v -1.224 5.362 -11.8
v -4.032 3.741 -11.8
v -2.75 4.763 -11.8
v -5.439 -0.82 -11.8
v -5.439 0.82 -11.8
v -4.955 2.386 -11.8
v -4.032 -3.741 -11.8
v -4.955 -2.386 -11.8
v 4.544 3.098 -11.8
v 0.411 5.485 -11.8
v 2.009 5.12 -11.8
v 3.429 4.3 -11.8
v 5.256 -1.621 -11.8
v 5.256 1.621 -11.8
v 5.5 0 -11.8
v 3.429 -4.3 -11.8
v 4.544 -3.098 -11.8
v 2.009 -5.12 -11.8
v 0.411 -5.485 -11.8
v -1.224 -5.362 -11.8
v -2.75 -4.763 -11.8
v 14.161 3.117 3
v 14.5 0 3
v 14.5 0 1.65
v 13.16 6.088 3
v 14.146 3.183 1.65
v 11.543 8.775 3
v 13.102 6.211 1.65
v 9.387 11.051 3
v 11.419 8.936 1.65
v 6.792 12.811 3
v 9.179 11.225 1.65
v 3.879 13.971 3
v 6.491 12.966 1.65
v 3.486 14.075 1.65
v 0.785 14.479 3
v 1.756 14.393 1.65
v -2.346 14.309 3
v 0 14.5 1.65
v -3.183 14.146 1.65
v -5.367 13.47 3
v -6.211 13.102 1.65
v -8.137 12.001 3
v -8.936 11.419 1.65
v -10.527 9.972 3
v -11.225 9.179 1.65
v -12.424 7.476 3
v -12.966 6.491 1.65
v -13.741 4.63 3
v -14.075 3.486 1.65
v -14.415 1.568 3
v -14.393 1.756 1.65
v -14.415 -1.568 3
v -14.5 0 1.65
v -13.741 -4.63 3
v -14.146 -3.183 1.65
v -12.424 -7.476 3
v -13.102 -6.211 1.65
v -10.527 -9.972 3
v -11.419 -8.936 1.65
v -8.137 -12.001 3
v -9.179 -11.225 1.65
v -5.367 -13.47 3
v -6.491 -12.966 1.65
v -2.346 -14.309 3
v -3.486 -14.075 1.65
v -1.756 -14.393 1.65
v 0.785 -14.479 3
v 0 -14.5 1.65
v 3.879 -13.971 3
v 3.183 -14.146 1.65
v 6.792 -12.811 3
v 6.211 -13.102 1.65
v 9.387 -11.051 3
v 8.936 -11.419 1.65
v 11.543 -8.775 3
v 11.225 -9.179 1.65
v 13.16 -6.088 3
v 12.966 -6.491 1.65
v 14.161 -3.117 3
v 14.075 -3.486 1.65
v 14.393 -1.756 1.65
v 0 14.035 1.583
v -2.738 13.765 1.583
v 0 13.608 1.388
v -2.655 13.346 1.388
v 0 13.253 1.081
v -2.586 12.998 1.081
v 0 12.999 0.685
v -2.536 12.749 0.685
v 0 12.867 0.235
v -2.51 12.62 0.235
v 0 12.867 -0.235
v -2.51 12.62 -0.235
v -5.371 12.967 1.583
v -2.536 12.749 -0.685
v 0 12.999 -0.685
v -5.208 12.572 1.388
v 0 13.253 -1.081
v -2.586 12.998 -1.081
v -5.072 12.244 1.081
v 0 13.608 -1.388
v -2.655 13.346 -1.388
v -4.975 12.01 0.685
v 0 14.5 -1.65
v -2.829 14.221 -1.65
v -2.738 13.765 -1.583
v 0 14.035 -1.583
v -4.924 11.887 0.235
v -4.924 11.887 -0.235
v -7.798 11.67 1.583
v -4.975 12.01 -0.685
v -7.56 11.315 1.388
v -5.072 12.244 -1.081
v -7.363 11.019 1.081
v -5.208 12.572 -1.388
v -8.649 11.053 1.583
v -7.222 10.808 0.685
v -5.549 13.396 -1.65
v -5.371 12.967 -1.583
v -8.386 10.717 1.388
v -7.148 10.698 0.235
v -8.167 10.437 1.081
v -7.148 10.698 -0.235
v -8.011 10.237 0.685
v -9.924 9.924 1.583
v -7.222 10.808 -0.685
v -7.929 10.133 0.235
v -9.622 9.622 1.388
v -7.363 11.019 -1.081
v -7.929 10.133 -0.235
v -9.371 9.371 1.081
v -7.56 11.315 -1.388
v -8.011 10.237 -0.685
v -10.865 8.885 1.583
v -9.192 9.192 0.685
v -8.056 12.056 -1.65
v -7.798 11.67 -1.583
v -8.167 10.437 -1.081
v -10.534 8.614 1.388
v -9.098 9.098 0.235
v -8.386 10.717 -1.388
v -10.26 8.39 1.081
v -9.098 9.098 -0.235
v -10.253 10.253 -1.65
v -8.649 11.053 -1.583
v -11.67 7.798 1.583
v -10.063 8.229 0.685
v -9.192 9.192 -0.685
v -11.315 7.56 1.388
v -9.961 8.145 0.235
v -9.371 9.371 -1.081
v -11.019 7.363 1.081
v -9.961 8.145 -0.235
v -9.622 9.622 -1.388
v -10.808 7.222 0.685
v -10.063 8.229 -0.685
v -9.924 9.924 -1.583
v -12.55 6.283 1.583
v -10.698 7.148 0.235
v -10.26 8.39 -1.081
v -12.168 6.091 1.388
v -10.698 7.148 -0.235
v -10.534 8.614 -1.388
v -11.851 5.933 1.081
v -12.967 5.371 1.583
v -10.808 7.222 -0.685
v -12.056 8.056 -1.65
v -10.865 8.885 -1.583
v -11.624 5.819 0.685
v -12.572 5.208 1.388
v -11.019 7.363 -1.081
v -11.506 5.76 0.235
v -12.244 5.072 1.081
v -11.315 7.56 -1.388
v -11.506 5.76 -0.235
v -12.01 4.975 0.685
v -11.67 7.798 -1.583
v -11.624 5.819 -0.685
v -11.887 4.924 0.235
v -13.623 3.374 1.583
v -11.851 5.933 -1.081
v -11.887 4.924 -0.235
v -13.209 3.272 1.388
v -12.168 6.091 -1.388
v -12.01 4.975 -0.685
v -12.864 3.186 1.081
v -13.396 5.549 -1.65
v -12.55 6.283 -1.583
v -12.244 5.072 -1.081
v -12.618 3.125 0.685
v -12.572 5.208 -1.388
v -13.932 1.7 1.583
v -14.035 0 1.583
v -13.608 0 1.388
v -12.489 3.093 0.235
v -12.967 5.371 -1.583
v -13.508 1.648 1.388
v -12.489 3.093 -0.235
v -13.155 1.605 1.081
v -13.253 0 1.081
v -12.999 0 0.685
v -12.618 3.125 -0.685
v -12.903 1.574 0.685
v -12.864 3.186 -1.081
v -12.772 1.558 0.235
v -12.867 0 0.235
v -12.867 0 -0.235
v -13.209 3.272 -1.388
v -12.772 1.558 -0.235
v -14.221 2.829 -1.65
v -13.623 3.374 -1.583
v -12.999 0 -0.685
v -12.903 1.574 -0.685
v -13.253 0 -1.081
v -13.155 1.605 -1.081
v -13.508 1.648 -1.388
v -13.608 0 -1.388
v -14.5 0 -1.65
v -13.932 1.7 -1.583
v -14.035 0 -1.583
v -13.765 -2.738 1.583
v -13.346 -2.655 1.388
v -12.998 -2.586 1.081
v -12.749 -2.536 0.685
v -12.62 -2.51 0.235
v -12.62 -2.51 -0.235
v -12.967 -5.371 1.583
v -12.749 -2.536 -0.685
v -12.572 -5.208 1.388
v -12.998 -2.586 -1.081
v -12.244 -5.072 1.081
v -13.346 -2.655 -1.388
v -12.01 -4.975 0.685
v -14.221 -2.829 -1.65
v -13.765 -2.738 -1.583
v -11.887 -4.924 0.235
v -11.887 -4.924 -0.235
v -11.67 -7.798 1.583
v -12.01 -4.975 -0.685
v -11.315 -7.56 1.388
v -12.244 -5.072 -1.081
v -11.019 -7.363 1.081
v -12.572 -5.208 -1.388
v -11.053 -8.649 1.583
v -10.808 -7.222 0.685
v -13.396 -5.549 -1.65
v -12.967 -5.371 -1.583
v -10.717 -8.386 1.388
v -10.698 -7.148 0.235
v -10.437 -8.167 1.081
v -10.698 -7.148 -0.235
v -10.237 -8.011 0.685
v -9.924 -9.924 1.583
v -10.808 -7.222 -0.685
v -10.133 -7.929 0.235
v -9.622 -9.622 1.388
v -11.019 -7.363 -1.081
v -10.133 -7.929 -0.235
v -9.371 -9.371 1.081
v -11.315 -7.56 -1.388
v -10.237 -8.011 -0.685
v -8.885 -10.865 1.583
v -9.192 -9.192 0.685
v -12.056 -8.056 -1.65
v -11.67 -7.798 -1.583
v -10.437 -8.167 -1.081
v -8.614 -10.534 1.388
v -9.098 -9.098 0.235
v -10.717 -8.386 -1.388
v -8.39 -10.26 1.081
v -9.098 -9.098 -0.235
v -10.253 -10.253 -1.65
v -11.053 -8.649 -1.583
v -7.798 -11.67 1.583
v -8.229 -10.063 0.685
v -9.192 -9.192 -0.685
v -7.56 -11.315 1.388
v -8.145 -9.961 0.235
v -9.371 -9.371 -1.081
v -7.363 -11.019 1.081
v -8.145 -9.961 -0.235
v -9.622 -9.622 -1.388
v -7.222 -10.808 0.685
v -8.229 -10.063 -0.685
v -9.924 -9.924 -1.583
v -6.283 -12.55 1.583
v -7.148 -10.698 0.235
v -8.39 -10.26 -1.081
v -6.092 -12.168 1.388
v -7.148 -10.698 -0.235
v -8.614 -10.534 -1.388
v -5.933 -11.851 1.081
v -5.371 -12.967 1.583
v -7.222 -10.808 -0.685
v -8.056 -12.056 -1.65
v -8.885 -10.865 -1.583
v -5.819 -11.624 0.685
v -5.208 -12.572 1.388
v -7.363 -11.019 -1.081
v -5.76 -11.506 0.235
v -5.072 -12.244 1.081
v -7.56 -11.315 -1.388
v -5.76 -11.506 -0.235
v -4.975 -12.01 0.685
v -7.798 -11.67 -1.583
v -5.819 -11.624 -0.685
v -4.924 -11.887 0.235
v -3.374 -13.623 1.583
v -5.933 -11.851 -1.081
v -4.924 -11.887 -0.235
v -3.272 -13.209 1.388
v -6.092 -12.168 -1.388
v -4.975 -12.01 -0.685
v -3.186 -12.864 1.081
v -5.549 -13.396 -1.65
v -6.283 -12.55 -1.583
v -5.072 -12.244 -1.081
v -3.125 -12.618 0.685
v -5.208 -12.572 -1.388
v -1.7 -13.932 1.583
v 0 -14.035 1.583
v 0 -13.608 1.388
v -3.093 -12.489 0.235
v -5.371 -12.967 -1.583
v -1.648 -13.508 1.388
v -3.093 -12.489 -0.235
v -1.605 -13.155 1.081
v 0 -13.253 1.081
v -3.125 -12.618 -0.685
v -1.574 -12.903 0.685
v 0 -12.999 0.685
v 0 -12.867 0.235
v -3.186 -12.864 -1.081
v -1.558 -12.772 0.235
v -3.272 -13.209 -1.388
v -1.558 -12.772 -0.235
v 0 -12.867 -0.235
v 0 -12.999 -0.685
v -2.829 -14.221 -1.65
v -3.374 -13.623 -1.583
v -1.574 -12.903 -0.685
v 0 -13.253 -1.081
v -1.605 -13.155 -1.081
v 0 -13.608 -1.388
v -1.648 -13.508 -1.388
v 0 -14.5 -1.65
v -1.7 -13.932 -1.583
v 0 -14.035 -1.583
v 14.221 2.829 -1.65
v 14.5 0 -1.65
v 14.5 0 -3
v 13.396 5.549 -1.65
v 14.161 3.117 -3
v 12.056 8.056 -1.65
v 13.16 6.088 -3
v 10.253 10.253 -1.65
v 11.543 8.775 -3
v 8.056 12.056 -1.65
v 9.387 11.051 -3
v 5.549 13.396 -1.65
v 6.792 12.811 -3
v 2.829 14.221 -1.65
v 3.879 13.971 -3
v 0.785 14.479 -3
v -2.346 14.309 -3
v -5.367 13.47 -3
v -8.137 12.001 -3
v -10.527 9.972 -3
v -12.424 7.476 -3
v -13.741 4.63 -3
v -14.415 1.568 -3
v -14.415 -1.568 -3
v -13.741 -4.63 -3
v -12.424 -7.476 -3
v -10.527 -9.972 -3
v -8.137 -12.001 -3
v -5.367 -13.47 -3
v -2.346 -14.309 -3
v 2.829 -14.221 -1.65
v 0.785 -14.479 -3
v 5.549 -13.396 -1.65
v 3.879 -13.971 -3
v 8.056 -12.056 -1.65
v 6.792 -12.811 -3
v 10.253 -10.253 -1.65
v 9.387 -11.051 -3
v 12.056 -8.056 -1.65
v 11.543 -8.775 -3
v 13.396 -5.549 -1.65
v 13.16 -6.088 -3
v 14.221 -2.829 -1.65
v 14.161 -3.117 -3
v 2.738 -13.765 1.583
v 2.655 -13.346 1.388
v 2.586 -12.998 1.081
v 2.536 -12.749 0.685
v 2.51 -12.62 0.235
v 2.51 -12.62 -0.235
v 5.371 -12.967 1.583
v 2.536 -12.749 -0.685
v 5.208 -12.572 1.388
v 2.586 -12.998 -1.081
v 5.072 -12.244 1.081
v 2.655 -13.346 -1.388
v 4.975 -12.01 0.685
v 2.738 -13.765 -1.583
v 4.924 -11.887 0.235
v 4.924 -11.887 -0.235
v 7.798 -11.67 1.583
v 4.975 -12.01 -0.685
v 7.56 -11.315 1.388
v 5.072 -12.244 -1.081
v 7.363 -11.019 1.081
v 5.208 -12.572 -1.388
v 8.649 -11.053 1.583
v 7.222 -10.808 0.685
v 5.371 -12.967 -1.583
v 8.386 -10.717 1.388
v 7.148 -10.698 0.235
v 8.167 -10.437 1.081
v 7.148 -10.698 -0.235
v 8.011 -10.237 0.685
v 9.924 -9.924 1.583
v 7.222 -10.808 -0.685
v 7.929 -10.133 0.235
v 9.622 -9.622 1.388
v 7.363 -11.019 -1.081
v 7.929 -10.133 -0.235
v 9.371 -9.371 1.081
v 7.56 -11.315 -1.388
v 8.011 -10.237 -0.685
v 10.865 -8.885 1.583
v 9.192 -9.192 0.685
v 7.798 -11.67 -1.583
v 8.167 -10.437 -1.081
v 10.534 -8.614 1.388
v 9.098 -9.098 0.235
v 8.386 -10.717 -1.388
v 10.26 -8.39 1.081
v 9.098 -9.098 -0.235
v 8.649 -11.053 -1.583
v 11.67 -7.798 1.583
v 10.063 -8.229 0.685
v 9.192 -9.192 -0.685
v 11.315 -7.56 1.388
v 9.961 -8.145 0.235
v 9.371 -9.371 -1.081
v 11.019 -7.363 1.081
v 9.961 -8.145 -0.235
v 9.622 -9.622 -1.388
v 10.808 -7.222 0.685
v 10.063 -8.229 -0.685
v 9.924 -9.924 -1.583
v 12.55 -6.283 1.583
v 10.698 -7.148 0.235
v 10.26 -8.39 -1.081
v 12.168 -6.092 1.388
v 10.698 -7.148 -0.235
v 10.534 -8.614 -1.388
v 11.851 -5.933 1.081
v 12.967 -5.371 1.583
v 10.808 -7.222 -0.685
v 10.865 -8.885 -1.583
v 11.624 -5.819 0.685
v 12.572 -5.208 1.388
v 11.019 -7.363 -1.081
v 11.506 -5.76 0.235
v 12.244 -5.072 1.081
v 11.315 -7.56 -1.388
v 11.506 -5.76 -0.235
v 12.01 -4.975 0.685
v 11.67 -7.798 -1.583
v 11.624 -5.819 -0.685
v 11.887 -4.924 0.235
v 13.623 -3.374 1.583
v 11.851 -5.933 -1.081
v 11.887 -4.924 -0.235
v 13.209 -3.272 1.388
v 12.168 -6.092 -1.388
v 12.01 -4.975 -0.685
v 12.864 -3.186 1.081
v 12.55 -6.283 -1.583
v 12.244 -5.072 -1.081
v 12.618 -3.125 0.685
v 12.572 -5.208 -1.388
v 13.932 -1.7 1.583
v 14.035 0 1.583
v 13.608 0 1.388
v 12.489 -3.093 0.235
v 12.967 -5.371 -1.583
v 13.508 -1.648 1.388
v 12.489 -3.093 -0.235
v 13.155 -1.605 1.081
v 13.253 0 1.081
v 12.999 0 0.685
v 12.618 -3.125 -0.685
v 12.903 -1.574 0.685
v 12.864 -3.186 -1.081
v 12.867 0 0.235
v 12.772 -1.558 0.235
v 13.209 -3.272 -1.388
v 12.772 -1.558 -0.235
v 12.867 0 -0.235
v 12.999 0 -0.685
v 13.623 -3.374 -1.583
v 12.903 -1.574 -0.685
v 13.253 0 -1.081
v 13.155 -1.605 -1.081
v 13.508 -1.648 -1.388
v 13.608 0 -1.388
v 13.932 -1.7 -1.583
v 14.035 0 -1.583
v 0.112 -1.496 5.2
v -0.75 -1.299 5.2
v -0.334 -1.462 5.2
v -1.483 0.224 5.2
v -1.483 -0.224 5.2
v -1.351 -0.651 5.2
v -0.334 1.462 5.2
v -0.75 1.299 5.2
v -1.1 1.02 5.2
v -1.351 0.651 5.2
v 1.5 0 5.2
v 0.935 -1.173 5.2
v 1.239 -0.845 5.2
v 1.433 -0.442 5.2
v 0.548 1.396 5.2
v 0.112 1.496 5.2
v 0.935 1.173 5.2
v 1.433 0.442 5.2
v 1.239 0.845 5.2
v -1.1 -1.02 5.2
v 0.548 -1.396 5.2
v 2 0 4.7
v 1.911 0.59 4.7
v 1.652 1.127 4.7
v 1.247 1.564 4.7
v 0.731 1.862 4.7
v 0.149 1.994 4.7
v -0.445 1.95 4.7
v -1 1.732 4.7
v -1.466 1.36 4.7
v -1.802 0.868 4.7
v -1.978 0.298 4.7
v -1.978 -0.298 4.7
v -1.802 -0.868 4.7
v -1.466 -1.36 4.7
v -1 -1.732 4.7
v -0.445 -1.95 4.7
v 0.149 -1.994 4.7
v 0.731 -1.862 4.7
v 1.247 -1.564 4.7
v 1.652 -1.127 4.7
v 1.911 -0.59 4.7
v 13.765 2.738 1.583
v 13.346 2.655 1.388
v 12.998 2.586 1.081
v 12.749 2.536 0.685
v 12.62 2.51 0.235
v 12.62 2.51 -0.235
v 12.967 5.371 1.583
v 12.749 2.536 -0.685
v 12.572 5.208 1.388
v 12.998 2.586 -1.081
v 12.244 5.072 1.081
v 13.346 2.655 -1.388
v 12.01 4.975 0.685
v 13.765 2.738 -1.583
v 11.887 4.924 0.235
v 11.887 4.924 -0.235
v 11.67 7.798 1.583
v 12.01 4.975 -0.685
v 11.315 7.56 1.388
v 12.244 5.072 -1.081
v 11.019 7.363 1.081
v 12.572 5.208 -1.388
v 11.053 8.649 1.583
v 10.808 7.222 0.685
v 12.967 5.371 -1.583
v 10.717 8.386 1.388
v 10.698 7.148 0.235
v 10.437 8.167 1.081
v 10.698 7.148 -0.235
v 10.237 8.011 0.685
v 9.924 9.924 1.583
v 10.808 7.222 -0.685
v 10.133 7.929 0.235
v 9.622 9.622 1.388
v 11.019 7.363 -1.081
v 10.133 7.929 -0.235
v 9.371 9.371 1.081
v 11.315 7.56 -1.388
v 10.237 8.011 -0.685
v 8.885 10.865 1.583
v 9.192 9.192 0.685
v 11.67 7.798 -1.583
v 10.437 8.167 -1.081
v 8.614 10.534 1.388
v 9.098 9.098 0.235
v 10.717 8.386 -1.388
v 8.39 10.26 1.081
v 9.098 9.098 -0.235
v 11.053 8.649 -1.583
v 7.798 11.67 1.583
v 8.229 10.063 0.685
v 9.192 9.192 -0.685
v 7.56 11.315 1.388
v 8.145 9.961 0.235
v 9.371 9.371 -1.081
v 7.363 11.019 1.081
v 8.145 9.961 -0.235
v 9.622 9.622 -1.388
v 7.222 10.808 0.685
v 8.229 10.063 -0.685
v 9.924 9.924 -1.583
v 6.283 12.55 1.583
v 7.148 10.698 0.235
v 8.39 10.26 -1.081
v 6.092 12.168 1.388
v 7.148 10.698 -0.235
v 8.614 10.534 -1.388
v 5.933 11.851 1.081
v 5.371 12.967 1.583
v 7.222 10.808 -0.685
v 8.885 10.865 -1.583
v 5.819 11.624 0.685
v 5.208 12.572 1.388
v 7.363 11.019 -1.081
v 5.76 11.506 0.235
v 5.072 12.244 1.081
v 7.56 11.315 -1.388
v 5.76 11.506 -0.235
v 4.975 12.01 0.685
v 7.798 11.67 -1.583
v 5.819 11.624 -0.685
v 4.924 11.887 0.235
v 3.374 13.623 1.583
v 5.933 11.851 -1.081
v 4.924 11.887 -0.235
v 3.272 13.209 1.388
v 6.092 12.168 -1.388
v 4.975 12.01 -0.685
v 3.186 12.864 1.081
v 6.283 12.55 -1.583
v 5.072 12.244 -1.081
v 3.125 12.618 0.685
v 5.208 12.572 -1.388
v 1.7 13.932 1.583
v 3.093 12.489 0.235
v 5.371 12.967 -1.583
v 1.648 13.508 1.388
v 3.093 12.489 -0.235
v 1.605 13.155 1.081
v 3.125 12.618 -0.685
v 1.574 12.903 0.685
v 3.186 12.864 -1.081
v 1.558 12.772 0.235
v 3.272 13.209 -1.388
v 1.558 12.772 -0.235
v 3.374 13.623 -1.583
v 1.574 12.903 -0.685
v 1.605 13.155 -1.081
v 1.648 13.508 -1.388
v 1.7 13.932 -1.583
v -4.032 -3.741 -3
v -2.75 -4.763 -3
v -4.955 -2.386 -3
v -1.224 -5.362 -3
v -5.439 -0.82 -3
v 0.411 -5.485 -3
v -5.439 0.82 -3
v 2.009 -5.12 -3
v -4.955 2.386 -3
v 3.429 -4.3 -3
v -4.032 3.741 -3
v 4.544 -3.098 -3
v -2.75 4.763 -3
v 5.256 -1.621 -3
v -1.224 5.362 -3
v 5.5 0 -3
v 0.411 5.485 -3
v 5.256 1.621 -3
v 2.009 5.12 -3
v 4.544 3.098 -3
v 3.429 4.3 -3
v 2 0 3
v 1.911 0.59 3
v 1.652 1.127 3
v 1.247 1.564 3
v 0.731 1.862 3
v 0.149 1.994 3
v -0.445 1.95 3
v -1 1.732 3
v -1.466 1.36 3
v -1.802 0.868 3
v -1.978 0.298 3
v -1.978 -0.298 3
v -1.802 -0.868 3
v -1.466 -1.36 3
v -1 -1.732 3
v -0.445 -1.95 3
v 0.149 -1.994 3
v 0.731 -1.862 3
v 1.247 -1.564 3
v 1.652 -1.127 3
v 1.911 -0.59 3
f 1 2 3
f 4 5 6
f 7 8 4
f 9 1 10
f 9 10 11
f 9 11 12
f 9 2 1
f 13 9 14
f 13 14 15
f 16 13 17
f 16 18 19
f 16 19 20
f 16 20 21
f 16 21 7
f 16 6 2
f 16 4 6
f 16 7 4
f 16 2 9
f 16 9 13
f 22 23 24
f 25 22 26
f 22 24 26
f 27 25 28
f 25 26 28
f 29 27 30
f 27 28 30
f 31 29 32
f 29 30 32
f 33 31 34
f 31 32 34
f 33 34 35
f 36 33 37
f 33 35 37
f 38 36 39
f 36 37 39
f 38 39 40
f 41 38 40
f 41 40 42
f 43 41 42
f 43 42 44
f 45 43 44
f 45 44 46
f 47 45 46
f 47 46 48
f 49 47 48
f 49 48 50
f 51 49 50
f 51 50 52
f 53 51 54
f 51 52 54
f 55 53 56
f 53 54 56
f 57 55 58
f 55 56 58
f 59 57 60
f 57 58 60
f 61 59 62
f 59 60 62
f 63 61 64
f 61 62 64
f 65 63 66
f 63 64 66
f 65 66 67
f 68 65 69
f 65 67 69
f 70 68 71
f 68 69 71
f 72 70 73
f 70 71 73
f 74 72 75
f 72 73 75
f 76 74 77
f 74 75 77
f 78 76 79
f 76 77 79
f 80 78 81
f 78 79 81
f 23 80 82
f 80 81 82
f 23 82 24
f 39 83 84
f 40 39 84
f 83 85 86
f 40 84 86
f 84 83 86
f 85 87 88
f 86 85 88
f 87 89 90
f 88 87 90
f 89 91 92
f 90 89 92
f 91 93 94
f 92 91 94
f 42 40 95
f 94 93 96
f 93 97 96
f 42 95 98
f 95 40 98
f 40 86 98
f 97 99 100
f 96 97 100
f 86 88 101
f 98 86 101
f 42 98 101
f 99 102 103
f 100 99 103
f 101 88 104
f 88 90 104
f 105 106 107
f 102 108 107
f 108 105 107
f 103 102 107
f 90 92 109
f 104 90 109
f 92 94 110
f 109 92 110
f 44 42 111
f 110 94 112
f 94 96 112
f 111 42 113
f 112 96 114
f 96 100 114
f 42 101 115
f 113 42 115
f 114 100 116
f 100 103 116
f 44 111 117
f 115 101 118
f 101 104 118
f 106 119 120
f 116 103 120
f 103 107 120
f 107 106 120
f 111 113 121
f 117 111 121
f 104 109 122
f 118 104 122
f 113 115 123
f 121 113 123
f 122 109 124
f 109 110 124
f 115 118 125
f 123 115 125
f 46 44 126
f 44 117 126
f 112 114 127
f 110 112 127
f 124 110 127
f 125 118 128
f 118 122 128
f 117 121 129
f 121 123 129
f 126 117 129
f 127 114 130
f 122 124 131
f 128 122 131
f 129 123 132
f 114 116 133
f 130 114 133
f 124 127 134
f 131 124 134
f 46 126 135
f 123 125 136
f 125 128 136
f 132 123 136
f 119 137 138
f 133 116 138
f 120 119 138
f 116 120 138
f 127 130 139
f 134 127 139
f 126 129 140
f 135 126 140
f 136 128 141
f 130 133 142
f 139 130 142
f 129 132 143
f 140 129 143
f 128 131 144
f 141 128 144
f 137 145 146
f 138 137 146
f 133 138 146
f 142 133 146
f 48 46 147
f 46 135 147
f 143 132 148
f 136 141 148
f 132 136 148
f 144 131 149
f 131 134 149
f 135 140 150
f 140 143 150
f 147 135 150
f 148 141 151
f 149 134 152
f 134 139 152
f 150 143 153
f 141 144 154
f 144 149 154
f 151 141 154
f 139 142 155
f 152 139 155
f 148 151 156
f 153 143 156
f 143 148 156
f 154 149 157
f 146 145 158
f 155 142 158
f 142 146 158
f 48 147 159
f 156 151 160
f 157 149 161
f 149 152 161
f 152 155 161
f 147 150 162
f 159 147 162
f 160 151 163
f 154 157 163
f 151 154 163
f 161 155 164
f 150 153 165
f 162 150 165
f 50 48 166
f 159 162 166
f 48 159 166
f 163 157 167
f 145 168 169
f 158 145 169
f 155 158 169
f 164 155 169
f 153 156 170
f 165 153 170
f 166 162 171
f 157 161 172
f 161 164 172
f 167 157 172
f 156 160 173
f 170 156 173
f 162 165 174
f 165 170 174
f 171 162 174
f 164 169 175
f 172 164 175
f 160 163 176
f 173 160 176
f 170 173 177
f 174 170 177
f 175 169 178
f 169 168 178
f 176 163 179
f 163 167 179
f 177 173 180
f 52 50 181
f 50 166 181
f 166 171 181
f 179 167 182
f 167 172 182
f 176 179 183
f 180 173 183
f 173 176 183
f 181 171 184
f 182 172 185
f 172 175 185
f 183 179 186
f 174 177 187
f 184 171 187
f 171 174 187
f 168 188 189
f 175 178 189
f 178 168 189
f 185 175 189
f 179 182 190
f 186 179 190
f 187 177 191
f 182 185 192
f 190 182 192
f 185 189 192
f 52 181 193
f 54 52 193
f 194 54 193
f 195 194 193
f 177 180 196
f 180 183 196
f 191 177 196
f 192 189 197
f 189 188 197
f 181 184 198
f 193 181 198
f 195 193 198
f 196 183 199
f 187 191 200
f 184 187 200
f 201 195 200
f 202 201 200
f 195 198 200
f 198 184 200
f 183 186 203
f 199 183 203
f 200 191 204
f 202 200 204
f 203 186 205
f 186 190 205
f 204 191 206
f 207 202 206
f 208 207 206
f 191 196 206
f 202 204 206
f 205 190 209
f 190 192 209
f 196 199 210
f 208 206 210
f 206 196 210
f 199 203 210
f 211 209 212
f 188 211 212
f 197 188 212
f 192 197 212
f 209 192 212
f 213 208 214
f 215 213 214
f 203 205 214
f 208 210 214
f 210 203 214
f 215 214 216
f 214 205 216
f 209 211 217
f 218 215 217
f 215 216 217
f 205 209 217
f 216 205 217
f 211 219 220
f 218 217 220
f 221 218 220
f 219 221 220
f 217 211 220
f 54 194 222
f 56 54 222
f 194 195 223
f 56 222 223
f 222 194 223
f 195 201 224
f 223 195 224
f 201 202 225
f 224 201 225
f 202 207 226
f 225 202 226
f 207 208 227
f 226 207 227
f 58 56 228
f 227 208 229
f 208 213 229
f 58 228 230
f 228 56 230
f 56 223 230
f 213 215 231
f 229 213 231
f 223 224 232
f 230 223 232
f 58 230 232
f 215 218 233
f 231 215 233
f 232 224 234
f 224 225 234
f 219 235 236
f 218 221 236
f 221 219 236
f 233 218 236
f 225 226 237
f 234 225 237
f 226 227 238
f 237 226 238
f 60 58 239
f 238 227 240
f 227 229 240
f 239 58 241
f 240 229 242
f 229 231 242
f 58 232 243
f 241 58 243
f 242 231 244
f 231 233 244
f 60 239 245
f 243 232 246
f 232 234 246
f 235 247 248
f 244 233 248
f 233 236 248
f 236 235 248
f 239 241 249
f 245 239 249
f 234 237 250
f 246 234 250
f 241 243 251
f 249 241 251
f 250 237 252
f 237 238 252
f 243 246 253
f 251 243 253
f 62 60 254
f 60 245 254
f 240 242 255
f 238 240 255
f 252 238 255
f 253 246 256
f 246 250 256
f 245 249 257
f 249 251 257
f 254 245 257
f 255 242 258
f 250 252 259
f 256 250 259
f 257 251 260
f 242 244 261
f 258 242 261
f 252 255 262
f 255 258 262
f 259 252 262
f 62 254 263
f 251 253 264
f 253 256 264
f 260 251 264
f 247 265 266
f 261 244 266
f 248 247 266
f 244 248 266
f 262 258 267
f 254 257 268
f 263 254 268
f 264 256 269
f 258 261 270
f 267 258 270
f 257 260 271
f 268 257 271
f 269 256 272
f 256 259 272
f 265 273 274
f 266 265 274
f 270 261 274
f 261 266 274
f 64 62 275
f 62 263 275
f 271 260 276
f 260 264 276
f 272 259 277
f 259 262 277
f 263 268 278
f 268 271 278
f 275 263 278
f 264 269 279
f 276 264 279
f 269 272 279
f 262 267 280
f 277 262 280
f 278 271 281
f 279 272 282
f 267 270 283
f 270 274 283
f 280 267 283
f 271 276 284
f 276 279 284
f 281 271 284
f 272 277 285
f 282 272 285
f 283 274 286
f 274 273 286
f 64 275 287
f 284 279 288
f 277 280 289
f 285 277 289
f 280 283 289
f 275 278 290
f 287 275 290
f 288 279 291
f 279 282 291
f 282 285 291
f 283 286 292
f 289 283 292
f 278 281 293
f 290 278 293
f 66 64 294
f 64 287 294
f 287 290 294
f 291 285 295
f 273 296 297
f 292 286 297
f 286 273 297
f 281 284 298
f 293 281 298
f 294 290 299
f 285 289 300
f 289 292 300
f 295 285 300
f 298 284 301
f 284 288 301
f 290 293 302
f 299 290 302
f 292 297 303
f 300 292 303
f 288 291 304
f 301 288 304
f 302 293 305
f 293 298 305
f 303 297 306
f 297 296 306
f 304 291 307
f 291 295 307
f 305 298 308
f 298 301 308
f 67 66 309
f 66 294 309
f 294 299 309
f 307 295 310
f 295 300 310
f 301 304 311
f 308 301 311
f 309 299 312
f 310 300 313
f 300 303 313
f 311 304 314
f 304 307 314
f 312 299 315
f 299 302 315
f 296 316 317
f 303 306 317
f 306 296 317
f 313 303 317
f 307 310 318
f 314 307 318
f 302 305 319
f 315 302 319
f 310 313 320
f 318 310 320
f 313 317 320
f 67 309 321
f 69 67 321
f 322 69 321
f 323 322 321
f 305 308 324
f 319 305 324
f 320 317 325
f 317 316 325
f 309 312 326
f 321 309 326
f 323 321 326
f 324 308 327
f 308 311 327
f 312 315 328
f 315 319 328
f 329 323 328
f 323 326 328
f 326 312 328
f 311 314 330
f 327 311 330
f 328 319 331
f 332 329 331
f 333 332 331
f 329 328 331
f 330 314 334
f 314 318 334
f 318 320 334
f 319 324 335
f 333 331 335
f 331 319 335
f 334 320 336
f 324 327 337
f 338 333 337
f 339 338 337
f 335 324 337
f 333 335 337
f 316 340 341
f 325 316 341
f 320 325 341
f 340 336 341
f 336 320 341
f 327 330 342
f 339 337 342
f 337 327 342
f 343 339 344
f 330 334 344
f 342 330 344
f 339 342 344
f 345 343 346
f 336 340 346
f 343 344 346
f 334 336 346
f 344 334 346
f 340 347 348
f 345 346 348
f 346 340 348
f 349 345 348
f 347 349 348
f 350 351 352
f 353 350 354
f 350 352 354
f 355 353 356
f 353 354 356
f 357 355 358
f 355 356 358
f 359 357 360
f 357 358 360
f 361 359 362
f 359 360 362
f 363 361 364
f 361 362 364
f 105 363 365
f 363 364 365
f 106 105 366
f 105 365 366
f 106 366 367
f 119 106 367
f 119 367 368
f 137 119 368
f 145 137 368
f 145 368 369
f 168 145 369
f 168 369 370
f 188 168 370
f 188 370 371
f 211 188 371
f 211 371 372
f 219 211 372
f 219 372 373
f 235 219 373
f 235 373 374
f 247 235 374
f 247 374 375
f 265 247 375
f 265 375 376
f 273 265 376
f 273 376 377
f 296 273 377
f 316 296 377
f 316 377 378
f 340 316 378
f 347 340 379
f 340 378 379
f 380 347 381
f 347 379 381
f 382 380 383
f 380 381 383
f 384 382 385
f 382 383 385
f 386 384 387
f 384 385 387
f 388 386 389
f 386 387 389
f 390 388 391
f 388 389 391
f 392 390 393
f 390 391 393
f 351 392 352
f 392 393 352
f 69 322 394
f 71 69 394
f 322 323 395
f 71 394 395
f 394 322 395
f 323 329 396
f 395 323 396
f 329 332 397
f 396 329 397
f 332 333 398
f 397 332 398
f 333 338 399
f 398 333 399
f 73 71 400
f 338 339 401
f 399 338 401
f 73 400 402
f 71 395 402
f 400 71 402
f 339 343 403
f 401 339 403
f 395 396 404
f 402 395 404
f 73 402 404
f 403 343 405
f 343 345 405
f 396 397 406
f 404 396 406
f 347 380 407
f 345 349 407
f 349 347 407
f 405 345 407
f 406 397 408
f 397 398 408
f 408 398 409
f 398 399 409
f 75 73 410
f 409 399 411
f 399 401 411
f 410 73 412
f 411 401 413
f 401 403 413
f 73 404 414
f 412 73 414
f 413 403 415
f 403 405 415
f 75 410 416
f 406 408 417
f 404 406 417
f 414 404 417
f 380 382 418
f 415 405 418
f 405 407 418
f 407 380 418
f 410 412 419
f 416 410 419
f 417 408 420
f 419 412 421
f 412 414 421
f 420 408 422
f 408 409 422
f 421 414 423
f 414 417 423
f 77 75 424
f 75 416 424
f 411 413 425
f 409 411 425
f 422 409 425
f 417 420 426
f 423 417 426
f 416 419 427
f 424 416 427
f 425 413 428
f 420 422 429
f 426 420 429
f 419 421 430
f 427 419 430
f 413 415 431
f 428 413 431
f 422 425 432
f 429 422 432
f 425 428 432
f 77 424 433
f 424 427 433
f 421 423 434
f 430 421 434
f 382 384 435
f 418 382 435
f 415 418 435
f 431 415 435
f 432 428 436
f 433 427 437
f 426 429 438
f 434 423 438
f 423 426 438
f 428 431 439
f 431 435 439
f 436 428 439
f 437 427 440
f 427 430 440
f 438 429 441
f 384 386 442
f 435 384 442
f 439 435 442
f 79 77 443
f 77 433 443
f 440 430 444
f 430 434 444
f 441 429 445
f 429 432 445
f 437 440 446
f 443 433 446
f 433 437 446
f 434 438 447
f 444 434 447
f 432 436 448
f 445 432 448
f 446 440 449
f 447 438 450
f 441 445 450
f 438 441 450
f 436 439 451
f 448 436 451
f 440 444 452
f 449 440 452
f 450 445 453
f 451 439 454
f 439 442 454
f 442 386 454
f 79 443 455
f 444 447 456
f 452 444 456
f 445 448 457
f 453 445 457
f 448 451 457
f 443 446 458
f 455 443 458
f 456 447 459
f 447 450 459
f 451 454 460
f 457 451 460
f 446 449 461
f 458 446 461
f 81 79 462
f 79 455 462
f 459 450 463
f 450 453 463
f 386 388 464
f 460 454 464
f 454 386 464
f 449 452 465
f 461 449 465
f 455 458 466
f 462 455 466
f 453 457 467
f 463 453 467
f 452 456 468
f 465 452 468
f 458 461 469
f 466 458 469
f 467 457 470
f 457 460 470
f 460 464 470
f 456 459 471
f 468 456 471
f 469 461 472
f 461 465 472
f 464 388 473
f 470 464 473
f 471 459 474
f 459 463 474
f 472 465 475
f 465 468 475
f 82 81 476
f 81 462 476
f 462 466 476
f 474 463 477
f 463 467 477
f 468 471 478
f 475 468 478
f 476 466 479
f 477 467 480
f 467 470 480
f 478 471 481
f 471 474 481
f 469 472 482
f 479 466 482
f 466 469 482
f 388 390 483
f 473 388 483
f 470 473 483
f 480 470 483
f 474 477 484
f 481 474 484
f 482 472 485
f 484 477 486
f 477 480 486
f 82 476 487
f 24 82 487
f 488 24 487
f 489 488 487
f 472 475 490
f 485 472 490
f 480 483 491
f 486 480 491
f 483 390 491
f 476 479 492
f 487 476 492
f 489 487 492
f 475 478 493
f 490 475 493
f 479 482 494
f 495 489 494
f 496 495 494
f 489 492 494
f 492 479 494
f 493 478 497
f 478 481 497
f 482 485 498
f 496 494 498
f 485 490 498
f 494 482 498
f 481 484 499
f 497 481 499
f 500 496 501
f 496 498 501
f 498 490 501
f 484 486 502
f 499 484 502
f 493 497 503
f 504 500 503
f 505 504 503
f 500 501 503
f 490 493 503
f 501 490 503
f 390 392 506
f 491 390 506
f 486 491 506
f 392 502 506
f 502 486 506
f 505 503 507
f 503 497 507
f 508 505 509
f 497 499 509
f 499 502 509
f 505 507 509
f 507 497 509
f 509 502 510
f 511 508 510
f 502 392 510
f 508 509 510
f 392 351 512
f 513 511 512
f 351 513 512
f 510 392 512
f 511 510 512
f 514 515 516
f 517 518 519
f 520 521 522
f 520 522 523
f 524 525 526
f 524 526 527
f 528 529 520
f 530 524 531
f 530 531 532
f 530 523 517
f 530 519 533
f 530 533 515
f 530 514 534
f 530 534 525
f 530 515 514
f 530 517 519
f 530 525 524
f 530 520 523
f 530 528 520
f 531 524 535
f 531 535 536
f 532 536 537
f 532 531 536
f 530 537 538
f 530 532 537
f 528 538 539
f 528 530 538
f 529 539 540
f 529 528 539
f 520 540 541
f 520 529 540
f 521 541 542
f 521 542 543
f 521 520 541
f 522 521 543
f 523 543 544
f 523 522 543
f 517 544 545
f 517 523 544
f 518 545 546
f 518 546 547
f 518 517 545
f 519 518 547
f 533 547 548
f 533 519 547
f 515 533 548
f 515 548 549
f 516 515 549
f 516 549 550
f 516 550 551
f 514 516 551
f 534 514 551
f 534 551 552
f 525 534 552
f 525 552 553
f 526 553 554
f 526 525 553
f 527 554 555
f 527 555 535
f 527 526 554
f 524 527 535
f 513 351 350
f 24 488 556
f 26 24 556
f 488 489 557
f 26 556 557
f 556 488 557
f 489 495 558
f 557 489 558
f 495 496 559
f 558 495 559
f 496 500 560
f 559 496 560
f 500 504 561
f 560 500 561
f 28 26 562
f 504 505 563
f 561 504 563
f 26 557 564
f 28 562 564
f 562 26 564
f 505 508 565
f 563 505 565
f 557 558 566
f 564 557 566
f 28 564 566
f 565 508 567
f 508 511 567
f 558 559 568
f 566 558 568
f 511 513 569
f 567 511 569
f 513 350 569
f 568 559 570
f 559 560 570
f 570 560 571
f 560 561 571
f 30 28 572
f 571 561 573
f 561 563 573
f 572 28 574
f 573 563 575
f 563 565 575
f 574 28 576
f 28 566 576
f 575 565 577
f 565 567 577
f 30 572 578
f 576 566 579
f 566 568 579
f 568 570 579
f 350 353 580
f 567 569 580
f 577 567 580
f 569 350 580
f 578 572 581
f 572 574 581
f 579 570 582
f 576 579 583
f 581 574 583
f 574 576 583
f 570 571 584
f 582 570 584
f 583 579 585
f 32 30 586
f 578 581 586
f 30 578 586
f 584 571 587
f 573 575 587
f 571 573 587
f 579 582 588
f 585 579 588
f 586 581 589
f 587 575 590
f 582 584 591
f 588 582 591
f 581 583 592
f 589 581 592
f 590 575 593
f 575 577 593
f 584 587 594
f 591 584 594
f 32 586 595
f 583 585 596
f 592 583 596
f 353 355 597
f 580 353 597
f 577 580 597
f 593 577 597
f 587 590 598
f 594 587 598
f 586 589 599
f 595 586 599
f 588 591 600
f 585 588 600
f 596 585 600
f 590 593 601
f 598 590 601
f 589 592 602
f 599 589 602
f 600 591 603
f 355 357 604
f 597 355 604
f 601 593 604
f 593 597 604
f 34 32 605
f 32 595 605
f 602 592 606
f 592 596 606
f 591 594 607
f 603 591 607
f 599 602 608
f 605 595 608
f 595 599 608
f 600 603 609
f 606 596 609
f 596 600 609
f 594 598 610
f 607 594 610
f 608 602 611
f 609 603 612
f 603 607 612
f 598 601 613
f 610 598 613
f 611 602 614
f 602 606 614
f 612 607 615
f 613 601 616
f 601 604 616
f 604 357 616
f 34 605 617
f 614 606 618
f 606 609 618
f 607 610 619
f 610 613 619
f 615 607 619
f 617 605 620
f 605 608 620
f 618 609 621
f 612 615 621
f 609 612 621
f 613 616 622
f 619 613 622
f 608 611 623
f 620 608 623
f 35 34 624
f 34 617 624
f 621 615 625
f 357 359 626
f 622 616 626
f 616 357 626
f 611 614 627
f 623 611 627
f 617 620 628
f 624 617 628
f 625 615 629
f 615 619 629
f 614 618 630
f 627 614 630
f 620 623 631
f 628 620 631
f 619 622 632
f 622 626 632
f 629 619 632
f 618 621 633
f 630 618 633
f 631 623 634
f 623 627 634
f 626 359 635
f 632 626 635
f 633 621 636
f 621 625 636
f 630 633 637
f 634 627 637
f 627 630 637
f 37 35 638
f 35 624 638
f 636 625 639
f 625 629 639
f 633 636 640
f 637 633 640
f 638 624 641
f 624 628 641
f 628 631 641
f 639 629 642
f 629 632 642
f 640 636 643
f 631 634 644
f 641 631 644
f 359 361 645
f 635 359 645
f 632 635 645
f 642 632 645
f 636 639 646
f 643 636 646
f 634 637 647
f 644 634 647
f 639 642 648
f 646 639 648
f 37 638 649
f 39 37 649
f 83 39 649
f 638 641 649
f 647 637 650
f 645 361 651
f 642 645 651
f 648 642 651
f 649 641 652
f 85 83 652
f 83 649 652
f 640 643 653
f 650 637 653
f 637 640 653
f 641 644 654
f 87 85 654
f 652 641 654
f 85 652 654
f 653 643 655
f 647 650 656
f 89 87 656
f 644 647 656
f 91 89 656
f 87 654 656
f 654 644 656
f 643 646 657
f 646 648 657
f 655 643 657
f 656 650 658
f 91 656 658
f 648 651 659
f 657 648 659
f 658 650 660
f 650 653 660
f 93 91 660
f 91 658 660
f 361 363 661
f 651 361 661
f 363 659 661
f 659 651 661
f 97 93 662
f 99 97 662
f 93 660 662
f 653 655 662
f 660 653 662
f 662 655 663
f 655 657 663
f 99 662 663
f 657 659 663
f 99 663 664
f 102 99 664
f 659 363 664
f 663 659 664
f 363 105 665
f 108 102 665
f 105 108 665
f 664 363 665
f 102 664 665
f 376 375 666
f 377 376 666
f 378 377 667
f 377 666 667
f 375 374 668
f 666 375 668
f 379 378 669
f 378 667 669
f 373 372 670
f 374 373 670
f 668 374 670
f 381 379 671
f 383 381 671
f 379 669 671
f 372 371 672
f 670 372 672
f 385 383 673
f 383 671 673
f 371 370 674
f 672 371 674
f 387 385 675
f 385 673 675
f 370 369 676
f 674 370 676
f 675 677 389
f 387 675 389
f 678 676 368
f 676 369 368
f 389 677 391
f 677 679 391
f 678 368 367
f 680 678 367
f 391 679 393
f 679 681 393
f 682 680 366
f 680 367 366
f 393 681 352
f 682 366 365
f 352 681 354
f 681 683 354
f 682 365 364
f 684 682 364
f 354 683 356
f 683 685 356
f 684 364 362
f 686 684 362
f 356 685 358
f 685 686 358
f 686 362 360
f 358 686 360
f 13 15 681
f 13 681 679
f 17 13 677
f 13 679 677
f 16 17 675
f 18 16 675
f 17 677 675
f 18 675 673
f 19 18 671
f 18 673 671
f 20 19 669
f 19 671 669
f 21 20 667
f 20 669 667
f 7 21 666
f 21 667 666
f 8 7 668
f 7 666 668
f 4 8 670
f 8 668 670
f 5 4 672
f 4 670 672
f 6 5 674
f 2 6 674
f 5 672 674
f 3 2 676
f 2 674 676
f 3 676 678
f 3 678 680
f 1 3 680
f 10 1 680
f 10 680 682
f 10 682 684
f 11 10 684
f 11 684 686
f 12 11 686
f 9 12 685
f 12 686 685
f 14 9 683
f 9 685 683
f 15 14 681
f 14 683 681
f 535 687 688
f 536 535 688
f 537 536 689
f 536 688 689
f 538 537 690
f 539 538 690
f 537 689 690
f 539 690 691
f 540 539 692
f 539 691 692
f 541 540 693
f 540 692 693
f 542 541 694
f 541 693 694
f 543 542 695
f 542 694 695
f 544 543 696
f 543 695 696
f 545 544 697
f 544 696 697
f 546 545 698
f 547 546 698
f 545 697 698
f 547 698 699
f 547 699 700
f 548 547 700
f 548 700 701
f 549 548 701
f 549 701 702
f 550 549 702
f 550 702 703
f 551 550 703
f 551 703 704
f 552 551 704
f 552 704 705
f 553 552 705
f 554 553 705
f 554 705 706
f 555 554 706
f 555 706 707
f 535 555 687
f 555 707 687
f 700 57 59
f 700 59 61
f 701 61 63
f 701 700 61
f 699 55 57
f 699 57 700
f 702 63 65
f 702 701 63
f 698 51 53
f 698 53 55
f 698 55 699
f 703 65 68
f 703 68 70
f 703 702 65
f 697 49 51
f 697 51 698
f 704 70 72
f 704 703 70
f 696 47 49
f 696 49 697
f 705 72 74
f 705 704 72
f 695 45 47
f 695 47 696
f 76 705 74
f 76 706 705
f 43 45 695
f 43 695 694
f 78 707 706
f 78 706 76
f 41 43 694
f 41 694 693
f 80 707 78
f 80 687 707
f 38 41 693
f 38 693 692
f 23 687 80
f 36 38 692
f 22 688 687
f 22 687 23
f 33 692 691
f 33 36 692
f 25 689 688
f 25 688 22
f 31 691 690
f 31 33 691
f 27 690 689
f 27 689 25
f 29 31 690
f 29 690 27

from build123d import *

# Parameters (mm, degrees)
BOSS_EXTRU_1_DEPTH      = 3
BOSS_EXTRU_1_DEPTH_BACK = 3
ESQUISSE1_R             = 14.5
ESQUISSE3_R             = 1.65
ESQUISSE4_R             = 2
BOSS_EXTRU_2_DEPTH      = 2.2
CHANFREIN1_SIZE         = 0.5
ESQUISSE5_R             = 5.5
BOSS_EXTRU_3_DEPTH      = 8.8


with BuildPart() as part:
    # Esquisse1 → Boss.-Extru.1 (new, two sides: drawn at the far end of the back side and taken through both)
    with BuildSketch(Plane.XY.offset(-BOSS_EXTRU_1_DEPTH_BACK)):
        Circle(ESQUISSE1_R)
    extrude(amount=BOSS_EXTRU_1_DEPTH + BOSS_EXTRU_1_DEPTH_BACK)

    # Enlèvement de matière-Balayage1: sweep along a curve in space
    with BuildLine() as enl_vement_de_mati_re_balayage1_path:
        ThreePointArc((14.5, 0, 3), (10.253048327, 10.253048327, 3), (0, 14.5, 3))
        ThreePointArc((0, 14.5, 3), (-10.253048327, 10.253048327, 3), (-14.5, 0, 3))
        ThreePointArc((-14.5, 0, 3), (-10.253048327, -10.253048327, 3), (0, -14.5, 3))
        ThreePointArc((0, -14.5, 3), (10.253048327, -10.253048327, 3), (14.5, 0, 3))
    # Esquisse3 → Enlèvement de matière-Balayage1 (sweep, cut)
    with BuildSketch(Plane(origin=(0, 0, 0), x_dir=(0, 0, -1), z_dir=(1, 0, 0))):
        with Locations((0, 14.5)):
            Circle(ESQUISSE3_R)
    sweep(path=enl_vement_de_mati_re_balayage1_path.line, mode=Mode.SUBTRACT)

    # Esquisse4 → Boss.-Extru.2 (add)
    with BuildSketch(Plane.XY.offset(3)):
        Circle(ESQUISSE4_R)
    extrude(amount=BOSS_EXTRU_2_DEPTH)

    # Chanfrein1
    chanfrein1_edges = [part.edges().sort_by_distance(p)[0] for p in [
        (-2, 0, 5.2),
    ]]
    chamfer(chanfrein1_edges, length=CHANFREIN1_SIZE)

    # Esquisse5 → Boss.-Extru.3 (add)
    with BuildSketch(Plane(origin=(0, 0, -3), x_dir=(-1, 0, 0), z_dir=(0, 0, -1))):
        Circle(ESQUISSE5_R)
    extrude(amount=BOSS_EXTRU_3_DEPTH)


solid = part.part
